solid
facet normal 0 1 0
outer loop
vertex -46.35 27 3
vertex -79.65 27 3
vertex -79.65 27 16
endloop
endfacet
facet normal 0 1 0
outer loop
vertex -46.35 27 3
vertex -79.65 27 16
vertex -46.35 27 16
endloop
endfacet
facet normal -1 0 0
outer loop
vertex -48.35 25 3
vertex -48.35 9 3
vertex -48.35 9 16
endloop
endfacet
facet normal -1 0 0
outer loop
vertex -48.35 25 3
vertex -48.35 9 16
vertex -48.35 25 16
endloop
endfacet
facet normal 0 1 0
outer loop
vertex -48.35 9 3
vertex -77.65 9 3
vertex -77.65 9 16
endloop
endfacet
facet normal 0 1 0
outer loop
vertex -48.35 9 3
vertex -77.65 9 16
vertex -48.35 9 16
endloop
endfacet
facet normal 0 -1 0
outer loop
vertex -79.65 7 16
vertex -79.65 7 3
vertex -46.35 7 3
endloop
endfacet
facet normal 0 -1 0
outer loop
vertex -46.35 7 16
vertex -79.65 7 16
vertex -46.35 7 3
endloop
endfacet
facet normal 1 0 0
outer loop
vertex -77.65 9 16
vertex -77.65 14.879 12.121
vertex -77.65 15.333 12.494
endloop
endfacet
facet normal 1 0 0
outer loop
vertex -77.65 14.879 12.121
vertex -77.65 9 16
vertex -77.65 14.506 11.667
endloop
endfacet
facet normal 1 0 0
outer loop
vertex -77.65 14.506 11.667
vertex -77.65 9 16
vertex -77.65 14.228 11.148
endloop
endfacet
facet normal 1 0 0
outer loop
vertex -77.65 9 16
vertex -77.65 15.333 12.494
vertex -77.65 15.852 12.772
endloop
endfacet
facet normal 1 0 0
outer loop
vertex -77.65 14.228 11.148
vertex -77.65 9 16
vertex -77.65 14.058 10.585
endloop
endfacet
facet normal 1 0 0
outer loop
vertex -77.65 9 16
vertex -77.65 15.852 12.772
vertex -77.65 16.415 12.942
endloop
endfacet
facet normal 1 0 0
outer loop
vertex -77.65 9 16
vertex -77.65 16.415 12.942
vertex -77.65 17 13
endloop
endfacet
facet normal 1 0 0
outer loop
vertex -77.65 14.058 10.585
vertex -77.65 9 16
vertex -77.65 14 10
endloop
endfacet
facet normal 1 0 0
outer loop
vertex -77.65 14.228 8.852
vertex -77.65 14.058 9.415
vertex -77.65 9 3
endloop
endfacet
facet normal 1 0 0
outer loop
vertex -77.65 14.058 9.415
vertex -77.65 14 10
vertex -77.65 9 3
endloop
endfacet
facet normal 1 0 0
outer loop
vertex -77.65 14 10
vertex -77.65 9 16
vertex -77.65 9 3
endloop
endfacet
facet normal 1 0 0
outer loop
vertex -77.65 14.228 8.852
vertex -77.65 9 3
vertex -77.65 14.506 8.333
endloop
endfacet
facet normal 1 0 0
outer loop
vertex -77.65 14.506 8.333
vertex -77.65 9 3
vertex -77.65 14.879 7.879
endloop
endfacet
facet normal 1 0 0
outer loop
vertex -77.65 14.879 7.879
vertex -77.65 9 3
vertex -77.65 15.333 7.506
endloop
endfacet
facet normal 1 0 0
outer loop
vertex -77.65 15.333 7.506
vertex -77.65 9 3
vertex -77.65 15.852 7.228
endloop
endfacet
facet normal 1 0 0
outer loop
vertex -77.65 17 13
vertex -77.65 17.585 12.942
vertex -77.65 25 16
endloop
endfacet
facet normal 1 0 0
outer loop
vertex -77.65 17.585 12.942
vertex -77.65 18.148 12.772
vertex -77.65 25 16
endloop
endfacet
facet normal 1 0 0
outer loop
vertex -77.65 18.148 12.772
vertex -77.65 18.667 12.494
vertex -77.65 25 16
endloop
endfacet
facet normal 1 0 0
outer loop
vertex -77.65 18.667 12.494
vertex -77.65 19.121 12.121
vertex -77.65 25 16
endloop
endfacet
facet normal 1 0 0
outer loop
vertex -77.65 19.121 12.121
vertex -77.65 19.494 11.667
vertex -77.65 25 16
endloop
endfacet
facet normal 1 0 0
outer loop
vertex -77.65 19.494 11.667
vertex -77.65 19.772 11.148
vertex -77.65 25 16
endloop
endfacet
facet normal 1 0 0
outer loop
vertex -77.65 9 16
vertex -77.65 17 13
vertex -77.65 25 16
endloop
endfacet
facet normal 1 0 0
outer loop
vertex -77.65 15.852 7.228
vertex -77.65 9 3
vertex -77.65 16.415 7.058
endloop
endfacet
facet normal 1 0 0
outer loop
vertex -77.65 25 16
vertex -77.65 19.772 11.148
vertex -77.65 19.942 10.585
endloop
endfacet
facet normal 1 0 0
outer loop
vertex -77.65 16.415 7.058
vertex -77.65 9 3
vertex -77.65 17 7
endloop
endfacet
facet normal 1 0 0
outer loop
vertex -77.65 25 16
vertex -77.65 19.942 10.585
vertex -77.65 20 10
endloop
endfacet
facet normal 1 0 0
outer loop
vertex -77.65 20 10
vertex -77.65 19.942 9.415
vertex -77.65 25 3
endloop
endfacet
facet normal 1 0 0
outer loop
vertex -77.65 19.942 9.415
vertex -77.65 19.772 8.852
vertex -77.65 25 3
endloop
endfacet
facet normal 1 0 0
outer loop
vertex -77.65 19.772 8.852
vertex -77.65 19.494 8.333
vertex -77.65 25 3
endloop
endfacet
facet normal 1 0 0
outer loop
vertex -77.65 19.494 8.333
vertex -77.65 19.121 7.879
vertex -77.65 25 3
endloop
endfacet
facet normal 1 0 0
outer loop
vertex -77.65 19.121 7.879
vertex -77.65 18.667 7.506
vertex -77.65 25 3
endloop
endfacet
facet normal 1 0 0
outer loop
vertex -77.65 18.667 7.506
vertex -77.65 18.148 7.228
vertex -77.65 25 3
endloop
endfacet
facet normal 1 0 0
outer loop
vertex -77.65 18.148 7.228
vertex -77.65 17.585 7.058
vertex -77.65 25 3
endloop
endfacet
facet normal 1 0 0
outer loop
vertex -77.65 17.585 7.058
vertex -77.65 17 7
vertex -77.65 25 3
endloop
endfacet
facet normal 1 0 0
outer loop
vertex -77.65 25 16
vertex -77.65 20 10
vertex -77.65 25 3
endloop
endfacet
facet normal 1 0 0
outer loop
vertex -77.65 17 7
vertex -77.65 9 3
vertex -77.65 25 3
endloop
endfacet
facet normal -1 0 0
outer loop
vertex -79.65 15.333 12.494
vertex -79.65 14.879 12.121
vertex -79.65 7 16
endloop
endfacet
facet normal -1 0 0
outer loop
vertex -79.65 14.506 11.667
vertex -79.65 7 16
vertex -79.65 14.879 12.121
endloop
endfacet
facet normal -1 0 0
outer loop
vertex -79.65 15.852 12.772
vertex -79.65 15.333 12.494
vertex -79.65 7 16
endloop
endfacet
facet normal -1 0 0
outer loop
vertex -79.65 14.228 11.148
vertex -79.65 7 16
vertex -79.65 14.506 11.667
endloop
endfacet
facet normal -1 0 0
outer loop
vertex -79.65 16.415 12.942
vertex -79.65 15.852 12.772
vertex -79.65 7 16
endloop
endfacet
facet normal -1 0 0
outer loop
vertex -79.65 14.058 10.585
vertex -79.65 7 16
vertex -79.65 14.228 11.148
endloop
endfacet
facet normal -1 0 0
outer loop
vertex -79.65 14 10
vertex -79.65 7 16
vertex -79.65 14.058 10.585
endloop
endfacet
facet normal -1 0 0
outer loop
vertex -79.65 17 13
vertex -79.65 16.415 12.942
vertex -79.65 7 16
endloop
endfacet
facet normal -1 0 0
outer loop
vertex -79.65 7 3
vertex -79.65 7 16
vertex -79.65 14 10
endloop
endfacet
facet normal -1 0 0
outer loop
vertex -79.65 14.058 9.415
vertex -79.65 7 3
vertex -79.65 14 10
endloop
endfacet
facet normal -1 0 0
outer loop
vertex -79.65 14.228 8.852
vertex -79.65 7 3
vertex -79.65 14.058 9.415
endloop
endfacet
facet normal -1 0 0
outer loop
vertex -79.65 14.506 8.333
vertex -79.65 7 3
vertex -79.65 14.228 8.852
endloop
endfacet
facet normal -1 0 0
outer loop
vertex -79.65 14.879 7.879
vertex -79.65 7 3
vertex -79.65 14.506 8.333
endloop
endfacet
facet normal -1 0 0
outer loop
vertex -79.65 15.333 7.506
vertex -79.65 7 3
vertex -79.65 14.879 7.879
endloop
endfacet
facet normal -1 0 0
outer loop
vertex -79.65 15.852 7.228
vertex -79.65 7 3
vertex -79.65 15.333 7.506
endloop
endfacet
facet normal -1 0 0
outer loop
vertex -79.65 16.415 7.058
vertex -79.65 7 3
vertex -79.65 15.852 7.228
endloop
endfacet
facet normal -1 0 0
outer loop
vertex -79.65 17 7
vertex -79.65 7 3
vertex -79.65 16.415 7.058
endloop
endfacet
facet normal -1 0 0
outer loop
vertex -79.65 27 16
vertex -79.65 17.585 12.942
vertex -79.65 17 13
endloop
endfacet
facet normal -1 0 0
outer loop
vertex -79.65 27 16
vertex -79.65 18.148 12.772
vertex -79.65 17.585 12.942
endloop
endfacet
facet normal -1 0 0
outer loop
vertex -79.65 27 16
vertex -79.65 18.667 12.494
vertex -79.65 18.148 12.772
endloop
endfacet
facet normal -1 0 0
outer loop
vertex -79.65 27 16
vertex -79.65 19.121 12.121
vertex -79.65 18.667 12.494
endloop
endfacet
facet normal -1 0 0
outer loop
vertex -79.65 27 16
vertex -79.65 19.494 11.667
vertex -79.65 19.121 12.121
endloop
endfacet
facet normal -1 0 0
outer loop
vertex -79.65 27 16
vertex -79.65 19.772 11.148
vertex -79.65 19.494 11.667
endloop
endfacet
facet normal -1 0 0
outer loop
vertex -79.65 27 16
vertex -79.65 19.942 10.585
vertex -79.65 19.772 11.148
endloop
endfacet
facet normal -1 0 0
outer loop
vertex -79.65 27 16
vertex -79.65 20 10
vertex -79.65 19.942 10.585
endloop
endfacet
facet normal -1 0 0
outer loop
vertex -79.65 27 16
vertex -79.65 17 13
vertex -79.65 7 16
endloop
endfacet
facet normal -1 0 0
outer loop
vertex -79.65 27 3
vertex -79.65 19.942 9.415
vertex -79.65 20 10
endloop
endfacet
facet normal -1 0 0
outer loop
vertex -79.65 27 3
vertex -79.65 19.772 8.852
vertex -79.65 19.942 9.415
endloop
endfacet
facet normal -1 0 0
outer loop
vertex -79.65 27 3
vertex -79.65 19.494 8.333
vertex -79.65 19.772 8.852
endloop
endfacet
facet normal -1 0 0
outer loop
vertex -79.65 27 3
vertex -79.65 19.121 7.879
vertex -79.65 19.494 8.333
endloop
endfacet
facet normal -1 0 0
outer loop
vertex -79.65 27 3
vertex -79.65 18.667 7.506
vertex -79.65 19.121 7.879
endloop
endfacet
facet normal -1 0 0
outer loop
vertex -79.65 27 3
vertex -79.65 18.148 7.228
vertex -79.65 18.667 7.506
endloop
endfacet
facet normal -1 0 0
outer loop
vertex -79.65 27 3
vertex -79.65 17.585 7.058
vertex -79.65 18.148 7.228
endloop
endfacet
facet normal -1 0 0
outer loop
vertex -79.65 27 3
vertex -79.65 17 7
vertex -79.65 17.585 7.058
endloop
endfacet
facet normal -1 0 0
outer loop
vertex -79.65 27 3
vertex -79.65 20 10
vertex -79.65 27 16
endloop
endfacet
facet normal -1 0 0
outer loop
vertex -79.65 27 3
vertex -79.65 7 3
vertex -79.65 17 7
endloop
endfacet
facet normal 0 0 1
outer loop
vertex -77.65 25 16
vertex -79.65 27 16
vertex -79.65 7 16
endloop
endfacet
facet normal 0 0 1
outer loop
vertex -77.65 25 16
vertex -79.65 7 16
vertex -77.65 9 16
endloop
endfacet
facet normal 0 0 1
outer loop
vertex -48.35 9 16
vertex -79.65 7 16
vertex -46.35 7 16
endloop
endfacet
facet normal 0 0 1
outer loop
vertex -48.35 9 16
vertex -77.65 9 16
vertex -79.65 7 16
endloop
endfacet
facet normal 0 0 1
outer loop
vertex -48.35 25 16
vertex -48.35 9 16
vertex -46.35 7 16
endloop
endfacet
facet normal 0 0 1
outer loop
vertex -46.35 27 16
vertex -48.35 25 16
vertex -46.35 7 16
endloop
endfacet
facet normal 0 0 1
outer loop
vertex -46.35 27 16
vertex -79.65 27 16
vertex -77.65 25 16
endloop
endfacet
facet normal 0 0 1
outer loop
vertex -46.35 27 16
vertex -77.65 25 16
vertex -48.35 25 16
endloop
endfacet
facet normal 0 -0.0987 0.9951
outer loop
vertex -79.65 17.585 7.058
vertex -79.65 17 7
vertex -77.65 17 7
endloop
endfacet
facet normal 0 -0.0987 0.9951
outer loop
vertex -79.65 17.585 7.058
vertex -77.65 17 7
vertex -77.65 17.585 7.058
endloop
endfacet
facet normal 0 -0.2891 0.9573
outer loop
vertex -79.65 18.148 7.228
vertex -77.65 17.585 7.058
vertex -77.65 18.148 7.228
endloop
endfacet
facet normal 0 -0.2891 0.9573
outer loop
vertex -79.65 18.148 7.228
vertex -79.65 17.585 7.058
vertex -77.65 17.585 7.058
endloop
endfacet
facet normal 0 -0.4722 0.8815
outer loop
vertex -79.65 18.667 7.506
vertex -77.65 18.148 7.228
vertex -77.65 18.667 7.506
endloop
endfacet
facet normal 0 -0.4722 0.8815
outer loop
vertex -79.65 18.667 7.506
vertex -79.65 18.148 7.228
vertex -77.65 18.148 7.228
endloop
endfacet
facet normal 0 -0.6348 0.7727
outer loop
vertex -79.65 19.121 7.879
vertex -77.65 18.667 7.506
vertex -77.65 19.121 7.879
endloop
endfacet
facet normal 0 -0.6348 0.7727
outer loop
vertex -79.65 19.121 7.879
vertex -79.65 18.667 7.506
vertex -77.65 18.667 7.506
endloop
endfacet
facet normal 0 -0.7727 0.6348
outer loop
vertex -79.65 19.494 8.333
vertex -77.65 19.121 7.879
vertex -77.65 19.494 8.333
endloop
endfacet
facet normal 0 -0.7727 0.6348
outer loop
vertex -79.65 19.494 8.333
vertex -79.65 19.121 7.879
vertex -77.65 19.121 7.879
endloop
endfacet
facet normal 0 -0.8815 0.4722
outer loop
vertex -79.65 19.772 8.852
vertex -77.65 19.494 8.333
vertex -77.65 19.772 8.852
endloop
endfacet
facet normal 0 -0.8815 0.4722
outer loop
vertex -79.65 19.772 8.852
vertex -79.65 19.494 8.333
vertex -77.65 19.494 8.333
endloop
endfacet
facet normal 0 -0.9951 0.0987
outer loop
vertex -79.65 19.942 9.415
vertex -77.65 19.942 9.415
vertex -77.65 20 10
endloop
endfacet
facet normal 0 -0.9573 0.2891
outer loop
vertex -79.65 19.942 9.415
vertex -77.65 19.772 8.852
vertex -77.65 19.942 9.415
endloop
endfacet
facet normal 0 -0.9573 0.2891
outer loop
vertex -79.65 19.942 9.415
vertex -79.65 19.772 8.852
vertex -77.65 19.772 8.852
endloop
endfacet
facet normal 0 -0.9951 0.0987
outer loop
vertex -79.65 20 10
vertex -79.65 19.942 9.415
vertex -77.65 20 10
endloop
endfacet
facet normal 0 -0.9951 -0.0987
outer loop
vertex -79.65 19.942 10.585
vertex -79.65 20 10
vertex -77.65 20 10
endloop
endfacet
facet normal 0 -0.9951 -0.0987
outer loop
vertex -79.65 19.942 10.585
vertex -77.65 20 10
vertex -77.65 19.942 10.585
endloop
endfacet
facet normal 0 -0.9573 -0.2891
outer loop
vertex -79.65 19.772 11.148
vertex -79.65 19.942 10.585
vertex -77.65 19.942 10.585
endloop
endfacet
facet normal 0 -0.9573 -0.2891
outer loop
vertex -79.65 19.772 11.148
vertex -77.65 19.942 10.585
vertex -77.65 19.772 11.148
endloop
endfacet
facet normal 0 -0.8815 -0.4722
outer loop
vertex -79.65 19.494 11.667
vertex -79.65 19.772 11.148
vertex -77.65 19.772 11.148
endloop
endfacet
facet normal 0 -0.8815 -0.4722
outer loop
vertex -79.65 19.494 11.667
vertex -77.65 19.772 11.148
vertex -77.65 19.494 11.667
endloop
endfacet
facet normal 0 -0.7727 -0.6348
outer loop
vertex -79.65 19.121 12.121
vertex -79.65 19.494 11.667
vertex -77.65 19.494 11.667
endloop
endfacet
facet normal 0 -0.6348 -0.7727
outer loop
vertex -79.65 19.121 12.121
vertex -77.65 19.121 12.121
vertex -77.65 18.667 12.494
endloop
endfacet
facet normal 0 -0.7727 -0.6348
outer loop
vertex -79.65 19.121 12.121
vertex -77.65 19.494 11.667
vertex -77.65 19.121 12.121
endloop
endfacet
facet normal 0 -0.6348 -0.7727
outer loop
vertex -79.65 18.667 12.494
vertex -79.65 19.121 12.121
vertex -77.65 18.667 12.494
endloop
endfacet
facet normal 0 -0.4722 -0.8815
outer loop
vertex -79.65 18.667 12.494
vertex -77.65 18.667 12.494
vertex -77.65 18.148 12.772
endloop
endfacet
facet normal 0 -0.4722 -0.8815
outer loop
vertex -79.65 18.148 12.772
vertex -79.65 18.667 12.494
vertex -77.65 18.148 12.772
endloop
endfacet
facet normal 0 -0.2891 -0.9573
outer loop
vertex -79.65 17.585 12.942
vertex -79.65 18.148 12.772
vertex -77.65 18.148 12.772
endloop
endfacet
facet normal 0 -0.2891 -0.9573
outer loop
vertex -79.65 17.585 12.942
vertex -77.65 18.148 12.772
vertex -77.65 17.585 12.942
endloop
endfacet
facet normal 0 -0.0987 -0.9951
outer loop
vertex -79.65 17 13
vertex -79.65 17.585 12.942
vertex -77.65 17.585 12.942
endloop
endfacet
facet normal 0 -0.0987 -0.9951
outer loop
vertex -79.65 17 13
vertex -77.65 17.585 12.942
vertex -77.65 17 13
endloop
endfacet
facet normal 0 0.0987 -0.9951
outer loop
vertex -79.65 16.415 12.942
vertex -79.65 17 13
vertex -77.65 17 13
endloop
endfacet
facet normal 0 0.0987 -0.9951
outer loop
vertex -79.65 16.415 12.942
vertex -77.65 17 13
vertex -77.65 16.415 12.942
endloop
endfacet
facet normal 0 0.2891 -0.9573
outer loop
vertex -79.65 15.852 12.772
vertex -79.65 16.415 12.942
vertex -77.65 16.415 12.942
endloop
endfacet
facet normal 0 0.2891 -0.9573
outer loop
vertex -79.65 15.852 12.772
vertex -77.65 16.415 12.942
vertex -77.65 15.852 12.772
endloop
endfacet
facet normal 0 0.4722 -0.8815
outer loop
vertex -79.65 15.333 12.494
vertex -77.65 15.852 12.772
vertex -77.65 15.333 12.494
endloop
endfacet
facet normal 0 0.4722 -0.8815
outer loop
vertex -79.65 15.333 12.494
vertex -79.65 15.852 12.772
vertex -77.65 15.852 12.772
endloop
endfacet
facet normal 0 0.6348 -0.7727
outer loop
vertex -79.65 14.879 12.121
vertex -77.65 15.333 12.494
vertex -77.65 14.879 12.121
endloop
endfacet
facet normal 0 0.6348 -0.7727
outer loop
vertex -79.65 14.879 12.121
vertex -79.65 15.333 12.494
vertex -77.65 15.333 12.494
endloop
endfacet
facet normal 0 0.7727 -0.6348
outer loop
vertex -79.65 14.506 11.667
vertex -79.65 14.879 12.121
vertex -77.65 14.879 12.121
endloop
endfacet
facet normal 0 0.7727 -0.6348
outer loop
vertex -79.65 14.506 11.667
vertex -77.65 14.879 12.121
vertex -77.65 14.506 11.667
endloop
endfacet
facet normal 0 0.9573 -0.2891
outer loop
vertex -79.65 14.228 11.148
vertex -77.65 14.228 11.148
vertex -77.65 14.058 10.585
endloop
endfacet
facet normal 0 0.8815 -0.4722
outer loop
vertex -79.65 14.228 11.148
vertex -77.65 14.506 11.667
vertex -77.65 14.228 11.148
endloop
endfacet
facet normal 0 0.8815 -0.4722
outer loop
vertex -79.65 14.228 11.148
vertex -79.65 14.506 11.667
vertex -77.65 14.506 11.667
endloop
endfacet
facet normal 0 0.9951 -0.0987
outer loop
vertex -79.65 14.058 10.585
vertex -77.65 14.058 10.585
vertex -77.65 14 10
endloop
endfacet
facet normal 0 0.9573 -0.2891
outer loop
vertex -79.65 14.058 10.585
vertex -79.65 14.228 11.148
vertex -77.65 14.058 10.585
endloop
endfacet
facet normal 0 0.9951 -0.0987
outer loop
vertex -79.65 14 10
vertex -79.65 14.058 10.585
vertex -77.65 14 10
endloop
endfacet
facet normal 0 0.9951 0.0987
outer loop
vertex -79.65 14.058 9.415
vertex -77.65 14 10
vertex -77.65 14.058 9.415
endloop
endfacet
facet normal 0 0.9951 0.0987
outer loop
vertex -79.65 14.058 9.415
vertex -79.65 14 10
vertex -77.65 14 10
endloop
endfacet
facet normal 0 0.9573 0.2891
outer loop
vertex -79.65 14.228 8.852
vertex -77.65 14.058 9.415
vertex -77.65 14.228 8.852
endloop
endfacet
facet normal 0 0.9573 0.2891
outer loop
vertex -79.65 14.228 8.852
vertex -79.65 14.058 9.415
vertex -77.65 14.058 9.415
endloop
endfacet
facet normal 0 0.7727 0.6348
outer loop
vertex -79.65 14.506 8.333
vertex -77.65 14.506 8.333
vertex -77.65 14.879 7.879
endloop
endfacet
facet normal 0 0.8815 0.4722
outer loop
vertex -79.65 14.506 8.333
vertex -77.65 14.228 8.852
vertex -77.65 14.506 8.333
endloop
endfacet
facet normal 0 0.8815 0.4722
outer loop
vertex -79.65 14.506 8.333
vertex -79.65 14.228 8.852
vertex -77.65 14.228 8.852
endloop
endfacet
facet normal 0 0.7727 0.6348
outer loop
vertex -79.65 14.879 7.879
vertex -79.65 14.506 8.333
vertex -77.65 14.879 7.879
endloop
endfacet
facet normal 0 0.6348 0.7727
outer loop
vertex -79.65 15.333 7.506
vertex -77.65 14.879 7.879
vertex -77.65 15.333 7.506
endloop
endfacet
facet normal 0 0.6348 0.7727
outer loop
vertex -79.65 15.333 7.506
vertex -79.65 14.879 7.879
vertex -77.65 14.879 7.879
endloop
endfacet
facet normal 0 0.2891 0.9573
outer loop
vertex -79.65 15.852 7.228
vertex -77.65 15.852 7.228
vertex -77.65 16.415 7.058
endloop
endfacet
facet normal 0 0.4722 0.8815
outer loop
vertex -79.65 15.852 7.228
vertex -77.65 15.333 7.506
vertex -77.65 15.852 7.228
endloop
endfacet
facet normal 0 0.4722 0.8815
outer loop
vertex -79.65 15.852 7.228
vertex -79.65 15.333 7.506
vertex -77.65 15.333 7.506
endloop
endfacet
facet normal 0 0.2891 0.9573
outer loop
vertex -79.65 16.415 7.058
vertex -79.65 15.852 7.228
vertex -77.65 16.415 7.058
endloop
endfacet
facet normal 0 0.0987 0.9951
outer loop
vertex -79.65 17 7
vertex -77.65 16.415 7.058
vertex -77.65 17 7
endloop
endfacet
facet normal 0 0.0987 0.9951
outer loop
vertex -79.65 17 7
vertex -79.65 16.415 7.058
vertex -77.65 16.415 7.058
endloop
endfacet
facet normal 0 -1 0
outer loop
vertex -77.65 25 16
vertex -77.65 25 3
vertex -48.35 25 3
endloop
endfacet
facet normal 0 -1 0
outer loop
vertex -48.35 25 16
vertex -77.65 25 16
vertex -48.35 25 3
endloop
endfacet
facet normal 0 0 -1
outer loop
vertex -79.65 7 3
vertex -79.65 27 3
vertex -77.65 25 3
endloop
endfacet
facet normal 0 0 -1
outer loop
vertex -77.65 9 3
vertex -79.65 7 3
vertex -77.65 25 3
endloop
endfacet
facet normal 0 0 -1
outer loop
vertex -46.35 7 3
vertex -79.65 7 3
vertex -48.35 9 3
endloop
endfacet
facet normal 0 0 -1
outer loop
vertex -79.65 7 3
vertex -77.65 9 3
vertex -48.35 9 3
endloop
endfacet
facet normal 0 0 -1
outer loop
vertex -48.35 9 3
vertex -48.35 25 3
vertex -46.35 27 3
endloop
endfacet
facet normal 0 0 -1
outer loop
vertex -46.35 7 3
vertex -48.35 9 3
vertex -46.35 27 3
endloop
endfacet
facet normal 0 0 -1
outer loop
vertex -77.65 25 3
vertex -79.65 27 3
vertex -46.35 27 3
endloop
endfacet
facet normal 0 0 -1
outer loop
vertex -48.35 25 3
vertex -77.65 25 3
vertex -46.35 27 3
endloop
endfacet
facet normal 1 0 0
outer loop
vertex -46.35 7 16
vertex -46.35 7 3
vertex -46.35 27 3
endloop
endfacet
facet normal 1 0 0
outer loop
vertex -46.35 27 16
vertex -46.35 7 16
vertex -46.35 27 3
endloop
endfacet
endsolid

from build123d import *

# Parameters (mm, degrees)
CYLINDER_R     = 3
CYLINDER_DEPTH = 10
SKETCH009_W    = 29.3
SKETCH009_H    = 16
PAD010_DEPTH   = 16
SKETCH010_W    = 33.3
SKETCH010_H    = 20
PAD009_DEPTH   = 13


with BuildPart() as zylinder:
    # Cylinder → Cylinder (new body)
    with BuildSketch(Plane(origin=(-83, -21, 10), x_dir=(0, 0, -1), z_dir=(1, 0, 0))):
        Circle(CYLINDER_R)
    extrude(amount=CYLINDER_DEPTH)


with BuildPart() as body_innen:
    # Sketch009 → Pad010 (new body)
    with BuildSketch(Plane.XY):
        Rectangle(SKETCH009_W, SKETCH009_H)
    extrude(amount=PAD010_DEPTH)


with BuildPart() as cut006:
    # Sketch010 → Pad009 (new body)
    with BuildSketch(Plane.XY):
        Rectangle(SKETCH010_W, SKETCH010_H)
    extrude(amount=PAD009_DEPTH)

    # Cut005: cut Body innen
    add(body_innen.part, mode=Mode.SUBTRACT)


with BuildPart() as cut006_1:
    # Cut005 placement: moved
    add(cut006.part.moved(Location((-63, -21, 3))))

    # Cut006: cut Zylinder
    add(zylinder.part, mode=Mode.SUBTRACT)


with BuildPart() as cut006_2:
    # Cut006 placement: moved
    add(cut006_1.part.moved(Location((0, 38, 0))))


solid = cut006_2.part
